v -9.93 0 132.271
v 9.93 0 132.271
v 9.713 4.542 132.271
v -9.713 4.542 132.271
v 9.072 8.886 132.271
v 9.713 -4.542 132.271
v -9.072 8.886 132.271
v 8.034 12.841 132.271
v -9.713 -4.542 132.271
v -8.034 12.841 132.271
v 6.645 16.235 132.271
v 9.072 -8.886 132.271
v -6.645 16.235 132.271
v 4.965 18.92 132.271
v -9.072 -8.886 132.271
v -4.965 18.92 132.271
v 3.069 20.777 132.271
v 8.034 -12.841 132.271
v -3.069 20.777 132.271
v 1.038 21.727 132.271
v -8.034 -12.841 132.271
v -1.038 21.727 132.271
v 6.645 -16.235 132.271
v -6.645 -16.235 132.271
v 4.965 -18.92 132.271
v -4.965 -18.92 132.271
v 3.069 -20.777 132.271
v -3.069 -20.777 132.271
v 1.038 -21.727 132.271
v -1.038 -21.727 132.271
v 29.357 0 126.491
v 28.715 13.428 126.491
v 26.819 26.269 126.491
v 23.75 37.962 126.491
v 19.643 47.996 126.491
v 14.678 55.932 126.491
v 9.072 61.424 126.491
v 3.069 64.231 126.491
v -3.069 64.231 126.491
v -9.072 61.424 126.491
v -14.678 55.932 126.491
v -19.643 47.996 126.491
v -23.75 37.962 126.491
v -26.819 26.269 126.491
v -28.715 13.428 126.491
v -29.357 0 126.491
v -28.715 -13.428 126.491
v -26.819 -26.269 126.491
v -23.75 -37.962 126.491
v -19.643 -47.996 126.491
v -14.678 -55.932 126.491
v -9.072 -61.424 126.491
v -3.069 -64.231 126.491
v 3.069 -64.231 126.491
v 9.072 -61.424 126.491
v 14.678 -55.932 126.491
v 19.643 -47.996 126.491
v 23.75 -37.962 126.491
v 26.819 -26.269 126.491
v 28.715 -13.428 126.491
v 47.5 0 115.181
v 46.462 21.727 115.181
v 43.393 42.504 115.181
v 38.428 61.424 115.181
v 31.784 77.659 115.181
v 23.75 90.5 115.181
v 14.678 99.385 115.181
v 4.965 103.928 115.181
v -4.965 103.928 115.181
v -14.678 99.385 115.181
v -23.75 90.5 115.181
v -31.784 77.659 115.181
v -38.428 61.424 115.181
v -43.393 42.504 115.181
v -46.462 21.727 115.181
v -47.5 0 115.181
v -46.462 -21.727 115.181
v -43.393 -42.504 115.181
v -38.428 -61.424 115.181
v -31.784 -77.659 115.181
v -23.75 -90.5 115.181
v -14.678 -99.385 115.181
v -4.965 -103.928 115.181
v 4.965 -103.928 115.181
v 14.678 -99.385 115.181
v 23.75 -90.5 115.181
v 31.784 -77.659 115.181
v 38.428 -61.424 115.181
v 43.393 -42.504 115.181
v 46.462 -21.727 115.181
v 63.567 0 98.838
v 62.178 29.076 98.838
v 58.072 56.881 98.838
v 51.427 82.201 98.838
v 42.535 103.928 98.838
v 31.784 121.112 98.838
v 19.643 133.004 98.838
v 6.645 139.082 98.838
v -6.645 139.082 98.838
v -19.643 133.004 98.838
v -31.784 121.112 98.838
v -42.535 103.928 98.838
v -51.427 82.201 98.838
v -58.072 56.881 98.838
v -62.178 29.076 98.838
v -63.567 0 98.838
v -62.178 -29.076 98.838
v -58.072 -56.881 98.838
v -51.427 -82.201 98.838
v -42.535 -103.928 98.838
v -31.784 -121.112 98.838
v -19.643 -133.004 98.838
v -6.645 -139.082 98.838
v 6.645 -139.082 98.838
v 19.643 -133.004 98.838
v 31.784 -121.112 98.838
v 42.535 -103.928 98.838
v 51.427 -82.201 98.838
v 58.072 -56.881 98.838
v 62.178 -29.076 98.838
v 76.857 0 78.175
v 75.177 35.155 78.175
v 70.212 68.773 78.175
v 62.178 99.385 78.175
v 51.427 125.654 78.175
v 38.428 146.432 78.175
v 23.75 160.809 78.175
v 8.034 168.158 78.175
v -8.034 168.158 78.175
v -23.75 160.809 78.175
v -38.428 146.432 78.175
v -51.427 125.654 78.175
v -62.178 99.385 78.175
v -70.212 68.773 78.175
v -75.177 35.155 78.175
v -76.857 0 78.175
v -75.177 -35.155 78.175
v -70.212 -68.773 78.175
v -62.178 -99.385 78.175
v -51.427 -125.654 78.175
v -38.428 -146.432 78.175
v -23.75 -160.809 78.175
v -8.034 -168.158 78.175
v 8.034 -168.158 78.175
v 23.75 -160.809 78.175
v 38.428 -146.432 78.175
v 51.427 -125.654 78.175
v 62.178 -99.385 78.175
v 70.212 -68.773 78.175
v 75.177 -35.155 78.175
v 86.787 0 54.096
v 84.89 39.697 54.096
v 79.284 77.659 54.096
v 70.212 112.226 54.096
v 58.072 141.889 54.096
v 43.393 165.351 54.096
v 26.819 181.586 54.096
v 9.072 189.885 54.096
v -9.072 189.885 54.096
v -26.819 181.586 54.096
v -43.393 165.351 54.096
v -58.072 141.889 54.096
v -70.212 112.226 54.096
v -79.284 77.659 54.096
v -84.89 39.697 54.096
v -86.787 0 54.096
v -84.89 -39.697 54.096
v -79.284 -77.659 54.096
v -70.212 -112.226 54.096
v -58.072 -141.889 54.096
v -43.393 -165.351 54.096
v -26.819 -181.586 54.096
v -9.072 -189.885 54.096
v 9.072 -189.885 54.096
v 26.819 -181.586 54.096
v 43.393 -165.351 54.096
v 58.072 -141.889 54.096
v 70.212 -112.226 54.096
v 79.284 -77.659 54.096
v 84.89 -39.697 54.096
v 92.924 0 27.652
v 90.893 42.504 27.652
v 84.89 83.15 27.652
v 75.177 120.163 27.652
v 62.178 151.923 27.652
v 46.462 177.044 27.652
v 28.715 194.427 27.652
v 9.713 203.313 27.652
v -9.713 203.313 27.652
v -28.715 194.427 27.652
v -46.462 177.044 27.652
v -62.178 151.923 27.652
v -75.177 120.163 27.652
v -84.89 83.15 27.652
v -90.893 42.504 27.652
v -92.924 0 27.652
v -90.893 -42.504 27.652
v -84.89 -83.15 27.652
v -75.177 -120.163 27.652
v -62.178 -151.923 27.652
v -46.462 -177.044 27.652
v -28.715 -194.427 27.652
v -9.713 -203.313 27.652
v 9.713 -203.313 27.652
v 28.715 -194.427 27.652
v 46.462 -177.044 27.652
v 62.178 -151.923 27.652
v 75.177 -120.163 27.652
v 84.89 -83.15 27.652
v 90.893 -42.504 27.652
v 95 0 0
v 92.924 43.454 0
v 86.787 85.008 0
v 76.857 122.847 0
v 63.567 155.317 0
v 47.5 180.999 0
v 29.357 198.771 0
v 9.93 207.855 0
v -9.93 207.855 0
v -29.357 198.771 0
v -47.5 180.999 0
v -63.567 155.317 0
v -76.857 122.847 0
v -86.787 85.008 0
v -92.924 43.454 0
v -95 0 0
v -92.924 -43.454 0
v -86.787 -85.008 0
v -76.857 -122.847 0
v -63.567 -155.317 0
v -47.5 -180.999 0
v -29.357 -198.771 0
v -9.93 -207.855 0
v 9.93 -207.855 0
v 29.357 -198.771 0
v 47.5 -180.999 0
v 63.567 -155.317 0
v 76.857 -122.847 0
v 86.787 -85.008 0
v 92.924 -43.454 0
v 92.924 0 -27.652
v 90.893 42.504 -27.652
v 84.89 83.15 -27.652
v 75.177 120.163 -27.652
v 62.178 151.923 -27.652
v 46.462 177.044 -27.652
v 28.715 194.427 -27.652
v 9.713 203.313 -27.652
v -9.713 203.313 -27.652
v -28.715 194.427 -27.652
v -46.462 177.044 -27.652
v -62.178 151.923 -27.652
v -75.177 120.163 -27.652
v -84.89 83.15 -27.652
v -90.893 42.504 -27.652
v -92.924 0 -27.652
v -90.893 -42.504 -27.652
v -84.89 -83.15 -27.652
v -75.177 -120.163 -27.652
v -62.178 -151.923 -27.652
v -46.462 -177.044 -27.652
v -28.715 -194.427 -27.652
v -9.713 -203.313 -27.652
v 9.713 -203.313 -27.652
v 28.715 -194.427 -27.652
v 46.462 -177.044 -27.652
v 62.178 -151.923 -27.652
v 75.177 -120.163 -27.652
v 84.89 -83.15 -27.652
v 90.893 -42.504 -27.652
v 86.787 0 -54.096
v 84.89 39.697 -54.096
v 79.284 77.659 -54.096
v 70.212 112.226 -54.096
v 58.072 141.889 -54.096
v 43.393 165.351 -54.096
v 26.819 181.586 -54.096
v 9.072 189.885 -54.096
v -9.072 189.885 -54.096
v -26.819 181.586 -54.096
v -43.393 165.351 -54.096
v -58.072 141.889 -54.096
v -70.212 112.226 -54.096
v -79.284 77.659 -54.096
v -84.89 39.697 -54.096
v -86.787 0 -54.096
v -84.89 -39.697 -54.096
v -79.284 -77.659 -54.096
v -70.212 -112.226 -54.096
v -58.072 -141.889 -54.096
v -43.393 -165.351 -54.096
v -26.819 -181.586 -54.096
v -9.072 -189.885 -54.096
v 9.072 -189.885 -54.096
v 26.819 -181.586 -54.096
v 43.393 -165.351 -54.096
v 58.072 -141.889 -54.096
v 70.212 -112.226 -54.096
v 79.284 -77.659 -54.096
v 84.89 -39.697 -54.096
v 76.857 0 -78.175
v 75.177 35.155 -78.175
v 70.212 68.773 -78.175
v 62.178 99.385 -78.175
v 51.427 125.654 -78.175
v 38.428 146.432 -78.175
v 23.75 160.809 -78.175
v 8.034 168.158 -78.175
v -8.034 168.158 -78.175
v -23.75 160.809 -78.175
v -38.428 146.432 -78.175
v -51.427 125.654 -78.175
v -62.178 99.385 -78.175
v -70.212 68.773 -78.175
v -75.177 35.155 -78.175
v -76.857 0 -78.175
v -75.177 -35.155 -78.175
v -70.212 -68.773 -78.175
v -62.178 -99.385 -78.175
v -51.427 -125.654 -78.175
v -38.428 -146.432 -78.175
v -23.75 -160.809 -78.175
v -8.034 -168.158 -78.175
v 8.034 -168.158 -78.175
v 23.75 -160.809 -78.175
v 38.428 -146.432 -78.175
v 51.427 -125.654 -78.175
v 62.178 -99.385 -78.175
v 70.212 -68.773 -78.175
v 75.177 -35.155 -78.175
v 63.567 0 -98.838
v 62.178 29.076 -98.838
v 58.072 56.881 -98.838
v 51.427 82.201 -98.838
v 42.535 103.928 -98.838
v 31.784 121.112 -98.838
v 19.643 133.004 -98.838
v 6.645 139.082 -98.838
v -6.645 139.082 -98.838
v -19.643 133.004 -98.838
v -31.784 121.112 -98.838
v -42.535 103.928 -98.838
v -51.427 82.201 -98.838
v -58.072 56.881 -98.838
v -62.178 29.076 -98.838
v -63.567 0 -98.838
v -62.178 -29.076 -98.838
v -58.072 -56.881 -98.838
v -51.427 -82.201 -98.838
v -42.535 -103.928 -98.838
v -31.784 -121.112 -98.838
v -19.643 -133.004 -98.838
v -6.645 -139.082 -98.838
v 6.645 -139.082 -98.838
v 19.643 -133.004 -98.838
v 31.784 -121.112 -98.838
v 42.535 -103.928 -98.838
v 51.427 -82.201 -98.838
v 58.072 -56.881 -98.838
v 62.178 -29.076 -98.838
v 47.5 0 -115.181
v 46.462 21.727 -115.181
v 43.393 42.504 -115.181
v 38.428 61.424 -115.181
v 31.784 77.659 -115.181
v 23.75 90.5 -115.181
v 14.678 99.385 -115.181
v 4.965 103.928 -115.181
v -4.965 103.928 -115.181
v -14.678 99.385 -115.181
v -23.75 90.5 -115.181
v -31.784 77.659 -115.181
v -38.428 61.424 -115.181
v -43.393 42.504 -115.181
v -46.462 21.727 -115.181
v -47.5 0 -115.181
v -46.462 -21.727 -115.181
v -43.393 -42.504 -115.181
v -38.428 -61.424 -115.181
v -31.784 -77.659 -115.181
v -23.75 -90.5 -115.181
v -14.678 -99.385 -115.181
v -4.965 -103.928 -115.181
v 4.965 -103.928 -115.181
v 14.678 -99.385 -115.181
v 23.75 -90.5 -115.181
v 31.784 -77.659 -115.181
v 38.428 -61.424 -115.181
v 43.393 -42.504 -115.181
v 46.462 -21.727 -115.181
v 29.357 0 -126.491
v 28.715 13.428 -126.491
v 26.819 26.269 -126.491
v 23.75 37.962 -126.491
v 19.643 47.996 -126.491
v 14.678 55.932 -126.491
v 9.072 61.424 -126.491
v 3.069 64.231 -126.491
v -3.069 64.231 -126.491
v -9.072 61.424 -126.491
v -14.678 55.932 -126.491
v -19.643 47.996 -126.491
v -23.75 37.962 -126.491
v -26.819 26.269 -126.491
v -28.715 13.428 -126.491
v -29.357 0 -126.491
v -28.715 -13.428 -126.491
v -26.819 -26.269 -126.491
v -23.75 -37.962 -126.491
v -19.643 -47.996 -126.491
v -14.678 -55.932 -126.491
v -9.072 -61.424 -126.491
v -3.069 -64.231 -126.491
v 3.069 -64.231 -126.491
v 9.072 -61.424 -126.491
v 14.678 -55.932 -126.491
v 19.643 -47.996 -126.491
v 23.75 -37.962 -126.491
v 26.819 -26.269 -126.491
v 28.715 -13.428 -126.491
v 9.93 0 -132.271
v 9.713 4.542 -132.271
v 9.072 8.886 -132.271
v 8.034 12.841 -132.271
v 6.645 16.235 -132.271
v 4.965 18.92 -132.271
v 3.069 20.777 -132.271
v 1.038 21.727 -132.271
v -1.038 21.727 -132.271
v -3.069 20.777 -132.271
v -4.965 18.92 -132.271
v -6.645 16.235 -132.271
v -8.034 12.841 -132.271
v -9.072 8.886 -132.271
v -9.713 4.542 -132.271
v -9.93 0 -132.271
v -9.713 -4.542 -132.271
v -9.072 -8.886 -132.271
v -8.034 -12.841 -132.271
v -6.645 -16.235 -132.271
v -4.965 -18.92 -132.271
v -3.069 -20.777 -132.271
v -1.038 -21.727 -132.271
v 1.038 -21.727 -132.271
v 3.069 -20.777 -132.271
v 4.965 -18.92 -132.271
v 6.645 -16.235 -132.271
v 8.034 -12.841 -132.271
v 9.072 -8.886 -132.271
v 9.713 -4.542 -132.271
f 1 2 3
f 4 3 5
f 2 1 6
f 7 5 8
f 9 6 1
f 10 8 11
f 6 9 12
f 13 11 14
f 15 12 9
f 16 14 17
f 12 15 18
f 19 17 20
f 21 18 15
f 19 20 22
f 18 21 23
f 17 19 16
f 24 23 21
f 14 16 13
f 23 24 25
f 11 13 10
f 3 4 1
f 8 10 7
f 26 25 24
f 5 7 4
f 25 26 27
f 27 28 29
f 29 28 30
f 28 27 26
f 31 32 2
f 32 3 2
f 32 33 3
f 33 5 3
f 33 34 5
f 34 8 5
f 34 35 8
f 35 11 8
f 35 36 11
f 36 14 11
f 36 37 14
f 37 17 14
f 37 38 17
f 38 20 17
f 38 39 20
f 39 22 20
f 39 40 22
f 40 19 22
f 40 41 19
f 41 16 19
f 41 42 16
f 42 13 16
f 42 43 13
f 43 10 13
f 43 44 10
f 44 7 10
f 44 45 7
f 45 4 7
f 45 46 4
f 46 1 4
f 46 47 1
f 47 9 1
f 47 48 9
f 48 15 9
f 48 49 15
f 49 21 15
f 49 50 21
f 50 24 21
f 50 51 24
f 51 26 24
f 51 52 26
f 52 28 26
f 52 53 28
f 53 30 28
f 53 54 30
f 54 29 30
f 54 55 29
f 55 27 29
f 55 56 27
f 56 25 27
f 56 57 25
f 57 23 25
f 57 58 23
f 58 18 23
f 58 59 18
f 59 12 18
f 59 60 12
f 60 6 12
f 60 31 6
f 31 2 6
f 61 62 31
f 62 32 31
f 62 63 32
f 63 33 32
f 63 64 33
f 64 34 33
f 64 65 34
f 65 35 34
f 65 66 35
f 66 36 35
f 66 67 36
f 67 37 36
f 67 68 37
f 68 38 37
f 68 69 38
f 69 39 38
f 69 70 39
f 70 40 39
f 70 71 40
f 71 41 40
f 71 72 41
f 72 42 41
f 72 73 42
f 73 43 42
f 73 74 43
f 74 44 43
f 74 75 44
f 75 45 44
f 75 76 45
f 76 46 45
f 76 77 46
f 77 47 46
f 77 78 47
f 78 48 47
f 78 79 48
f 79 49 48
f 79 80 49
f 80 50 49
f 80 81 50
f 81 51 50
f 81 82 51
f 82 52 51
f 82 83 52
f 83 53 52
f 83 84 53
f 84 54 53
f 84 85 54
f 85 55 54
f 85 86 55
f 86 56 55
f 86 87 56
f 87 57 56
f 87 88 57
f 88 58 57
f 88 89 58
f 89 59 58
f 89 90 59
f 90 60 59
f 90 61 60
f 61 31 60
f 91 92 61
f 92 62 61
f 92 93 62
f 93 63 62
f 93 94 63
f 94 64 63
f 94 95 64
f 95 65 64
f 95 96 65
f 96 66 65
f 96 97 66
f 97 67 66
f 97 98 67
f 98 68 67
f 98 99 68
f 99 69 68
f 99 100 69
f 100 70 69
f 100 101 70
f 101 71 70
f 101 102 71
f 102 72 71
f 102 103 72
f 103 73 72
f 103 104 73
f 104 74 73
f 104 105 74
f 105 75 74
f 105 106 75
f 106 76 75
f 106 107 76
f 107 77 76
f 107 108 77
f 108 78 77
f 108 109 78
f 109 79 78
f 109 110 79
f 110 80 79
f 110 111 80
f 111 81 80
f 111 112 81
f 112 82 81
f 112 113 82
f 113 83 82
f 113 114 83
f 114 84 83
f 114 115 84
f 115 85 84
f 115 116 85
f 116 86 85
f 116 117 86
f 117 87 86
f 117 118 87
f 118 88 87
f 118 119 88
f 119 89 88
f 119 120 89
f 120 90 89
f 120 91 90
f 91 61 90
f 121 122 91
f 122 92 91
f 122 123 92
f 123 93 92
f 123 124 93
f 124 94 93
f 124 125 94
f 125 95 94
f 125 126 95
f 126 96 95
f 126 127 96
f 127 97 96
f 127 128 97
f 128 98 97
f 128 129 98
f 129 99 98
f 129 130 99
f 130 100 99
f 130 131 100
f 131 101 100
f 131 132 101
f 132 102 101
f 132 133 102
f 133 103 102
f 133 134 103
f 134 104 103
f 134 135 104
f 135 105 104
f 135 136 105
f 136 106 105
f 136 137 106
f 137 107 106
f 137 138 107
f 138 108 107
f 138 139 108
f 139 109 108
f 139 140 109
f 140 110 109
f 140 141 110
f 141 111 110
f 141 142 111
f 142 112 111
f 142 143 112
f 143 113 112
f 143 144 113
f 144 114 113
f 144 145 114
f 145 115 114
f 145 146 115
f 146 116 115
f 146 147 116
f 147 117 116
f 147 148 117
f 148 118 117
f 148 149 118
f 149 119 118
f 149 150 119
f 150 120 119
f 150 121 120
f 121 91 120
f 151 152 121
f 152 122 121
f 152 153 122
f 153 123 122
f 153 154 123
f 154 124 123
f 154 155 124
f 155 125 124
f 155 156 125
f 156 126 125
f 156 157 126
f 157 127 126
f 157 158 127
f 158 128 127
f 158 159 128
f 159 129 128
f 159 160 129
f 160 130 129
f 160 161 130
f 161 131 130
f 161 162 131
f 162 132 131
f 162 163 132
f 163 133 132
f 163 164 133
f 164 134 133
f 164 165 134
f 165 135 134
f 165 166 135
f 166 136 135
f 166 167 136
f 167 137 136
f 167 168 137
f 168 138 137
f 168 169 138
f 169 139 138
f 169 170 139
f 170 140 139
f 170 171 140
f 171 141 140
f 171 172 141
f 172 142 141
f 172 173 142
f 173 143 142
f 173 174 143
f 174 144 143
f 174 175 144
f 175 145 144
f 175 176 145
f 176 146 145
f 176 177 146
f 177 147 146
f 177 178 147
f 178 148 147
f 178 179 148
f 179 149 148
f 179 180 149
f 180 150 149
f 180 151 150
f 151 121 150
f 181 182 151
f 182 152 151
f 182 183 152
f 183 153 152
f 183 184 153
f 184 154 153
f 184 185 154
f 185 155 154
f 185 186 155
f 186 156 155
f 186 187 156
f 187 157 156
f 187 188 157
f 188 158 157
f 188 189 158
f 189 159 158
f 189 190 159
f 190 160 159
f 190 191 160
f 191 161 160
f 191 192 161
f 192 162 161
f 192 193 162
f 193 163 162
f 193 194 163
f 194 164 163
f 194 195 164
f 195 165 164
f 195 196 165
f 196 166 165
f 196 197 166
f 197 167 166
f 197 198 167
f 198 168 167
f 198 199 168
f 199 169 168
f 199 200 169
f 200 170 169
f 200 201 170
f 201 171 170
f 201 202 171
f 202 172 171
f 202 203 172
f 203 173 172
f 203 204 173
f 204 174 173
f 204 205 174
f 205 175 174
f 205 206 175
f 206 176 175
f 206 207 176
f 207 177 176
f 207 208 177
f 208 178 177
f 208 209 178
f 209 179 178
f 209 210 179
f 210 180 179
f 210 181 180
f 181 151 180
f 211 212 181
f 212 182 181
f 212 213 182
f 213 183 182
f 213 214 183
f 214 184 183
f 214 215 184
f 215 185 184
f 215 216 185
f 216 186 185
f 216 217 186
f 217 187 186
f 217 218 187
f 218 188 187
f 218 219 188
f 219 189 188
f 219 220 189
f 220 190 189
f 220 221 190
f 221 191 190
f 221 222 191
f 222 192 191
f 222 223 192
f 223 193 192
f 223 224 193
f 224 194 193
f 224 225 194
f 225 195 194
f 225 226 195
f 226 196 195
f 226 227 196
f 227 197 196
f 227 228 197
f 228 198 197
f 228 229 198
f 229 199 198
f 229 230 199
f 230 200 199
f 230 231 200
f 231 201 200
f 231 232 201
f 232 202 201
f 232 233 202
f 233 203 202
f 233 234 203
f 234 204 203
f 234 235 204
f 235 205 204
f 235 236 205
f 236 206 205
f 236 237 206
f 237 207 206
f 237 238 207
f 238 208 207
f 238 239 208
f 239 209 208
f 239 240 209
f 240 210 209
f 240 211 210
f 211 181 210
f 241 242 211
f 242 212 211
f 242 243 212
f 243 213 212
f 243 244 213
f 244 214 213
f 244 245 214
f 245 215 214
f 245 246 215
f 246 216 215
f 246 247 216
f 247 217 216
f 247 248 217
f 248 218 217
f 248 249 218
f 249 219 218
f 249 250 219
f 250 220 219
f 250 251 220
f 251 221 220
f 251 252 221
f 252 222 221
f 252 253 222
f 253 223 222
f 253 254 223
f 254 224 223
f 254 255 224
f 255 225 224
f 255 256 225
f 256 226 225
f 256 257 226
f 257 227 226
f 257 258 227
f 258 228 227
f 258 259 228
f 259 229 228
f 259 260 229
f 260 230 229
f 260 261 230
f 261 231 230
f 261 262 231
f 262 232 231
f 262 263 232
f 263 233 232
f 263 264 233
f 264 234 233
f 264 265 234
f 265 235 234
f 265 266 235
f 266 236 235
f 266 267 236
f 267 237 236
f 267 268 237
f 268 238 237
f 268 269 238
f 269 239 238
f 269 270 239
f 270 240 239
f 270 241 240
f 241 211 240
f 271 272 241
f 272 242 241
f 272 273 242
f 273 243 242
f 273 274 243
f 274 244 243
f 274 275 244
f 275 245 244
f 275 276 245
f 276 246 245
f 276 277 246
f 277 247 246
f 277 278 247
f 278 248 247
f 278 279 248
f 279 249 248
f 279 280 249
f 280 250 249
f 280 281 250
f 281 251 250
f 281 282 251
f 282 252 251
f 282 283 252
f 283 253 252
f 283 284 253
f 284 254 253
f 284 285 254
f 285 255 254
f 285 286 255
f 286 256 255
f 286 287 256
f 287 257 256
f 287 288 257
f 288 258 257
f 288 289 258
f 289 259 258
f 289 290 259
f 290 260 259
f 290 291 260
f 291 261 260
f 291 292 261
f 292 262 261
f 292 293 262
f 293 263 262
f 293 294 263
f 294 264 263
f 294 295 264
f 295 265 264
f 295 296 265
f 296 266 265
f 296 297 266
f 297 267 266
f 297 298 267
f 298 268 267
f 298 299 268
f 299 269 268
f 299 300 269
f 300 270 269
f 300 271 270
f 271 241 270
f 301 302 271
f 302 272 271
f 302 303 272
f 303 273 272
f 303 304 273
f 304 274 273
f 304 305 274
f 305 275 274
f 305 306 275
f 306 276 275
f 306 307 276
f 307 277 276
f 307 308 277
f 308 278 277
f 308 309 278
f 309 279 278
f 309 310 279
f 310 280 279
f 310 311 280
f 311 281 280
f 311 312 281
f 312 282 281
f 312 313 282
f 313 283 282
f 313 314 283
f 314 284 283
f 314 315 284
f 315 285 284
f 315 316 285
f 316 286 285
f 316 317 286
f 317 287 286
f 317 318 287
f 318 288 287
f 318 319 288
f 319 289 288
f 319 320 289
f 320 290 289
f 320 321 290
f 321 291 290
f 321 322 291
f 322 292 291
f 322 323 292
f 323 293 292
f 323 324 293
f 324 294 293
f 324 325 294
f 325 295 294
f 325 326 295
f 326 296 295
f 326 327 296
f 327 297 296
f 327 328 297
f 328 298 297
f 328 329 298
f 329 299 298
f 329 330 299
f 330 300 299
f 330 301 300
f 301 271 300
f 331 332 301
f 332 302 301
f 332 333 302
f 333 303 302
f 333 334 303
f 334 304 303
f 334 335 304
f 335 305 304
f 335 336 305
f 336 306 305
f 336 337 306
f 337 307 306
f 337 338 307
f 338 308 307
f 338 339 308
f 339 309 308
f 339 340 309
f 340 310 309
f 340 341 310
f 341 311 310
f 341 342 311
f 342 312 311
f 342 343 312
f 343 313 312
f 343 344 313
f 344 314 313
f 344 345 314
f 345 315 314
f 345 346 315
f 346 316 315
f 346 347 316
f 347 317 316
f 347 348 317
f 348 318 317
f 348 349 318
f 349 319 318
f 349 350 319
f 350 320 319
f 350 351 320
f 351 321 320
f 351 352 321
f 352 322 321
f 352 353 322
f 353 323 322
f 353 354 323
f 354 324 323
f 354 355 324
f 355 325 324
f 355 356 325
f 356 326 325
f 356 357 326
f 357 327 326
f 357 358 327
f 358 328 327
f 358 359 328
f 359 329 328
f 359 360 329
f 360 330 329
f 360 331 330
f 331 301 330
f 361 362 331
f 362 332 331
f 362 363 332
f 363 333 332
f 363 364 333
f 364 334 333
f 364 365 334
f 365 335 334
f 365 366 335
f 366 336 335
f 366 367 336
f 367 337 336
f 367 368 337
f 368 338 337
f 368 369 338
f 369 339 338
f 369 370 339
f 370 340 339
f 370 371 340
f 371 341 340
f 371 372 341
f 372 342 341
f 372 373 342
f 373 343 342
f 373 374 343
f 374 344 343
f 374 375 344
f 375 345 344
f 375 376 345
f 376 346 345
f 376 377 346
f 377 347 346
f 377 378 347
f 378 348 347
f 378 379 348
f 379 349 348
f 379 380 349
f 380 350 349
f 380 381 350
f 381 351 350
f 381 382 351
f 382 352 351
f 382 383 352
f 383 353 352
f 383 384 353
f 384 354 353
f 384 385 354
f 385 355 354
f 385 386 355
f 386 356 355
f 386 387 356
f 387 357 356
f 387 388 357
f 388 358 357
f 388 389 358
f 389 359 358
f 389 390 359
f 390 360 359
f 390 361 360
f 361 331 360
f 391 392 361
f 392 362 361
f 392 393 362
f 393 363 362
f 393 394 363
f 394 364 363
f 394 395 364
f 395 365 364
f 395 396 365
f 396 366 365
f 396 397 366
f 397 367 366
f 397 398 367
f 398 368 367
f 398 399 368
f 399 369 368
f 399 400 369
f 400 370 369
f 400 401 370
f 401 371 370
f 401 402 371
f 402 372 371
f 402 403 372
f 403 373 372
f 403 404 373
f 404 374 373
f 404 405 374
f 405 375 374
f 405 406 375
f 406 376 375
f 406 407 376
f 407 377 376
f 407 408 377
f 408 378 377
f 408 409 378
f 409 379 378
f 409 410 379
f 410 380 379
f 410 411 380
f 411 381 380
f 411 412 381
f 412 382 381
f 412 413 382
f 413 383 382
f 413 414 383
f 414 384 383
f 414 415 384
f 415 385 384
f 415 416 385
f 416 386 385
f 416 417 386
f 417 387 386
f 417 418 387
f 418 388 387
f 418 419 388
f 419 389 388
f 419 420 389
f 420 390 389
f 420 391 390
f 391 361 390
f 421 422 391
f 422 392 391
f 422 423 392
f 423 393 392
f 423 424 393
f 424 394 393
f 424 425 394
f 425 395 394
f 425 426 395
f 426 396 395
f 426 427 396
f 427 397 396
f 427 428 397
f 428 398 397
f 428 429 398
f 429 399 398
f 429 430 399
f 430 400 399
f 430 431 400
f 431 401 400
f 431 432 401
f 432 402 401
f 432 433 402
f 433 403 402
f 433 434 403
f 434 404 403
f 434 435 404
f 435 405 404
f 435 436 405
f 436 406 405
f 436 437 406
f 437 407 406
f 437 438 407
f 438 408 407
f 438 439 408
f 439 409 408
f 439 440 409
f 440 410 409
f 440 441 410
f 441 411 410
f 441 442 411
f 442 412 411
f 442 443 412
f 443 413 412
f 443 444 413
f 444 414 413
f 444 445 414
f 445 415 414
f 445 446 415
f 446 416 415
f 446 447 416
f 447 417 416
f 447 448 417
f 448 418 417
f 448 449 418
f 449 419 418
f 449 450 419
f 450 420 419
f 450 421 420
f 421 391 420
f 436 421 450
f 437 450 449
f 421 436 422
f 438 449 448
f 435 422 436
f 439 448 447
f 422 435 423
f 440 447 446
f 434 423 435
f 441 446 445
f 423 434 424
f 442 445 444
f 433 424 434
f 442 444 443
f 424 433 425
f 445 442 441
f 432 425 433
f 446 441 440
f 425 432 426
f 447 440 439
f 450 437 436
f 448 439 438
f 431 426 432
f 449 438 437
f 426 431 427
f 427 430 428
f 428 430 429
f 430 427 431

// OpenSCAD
// Generated by SolidPython 1.0.1 on 2020-07-29 00:46:46


scale(v = [5, 11, 7]) {
	sphere(r = 19);
}
/***********************************************
*********      SolidPython code:      **********
************************************************
 
# import packages: SolidPython
from solid import *
from solid.utils import *
from itertools import chain, combinations, permutations


class Resize:

    def __init__(self, scad_file):
        self.scad_file = scad_file
        #self.scad_file = import_scad(scad_file)
        # cone/cylinder param:
        self.r1 = 0
        self.r2 = 0
        self.h = 0
        # rectangular prism param:
        self.w = 0
        self.l = 0
        # ellipse param:
        self.r = 0

    # import OpenScad code (file name corresponds to shape)


    # classify shape + parameters
    def assign(self, param1, param2, param3):
        if self.scad_file == 'cone.scad':
            self.r1 = param1
            self.r2 = param2
            self.h = param3
        elif self.scad_file == 'cylinder.scad':
            self.r1 = param1
            self.r2 = param2
            self.h = param3
        elif self.scad_file == 'rectangularPrism.scad':
            self.h = param1
            self.l = param2
            self.w = param3
        else:
            self.r = param1
            self.h = param2

    # resize parameters
    def iterate(self):
        x = range(3, 20, 2)
        i = 1
        if self.scad_file == 'cone.scad':
            tempList = list(permutations(x, 2))
            for temp in tempList:
                param1 = temp[0]
                param2 = temp[1]
                filepath = 'produced_scad_files/' + 'cone' + str(param1) + '_' + str(param2) + '_' + '.scad'
                scad_render_to_file(cylinder(h=param1, r1=param2, r2=0), filepath)

        elif self.scad_file == 'cylinder.scad':
            tempList = list(permutations(x, 3))
            for temp in tempList:
                param1 = temp[0]
                param2 = temp[1]
                filepath = 'produced_scad_files/' + 'cylinder' + str(param1) + '_' + str(param2) + '_' + '.scad'
                scad_render_to_file(cylinder(h=param1, r1=param2, r2=param2), filepath)

        elif self.scad_file == 'rectangularPrism.scad':
            tempList = list(permutations(x, 3))
            for temp in tempList:
                param1 = temp[0]
                param2 = temp[1]
                param3 = temp[2]
                filepath = 'produced_scad_files/' + 'rectangularPrism' + str(param1) + '_' + str(param2) + '_' + str(
                    param3) + '.scad'
                scad_render_to_file(cube(size=(param1, param2, param3)), filepath)

        elif self.scad_file == 'ellipse.scad':
            tempList = list(permutations(x, 4))
            for temp in tempList:
                param1 = temp[0]
                param2 = temp[1]
                param3 = temp[2]
                param4 = temp[3]
                filepath = 'produced_scad_files/' + 'ellipse' + str(param1) + '_' + str(param2) + '_' + str(param3) + '_' + str(param4) + '.scad'
                scad_render_to_file(scale([param1, param2, param3])(sphere(r=param4)), filepath)

    def render_to_scadfile(self):
        scad_render_to_file(scad, 'example.scad') 
 
************************************************/
